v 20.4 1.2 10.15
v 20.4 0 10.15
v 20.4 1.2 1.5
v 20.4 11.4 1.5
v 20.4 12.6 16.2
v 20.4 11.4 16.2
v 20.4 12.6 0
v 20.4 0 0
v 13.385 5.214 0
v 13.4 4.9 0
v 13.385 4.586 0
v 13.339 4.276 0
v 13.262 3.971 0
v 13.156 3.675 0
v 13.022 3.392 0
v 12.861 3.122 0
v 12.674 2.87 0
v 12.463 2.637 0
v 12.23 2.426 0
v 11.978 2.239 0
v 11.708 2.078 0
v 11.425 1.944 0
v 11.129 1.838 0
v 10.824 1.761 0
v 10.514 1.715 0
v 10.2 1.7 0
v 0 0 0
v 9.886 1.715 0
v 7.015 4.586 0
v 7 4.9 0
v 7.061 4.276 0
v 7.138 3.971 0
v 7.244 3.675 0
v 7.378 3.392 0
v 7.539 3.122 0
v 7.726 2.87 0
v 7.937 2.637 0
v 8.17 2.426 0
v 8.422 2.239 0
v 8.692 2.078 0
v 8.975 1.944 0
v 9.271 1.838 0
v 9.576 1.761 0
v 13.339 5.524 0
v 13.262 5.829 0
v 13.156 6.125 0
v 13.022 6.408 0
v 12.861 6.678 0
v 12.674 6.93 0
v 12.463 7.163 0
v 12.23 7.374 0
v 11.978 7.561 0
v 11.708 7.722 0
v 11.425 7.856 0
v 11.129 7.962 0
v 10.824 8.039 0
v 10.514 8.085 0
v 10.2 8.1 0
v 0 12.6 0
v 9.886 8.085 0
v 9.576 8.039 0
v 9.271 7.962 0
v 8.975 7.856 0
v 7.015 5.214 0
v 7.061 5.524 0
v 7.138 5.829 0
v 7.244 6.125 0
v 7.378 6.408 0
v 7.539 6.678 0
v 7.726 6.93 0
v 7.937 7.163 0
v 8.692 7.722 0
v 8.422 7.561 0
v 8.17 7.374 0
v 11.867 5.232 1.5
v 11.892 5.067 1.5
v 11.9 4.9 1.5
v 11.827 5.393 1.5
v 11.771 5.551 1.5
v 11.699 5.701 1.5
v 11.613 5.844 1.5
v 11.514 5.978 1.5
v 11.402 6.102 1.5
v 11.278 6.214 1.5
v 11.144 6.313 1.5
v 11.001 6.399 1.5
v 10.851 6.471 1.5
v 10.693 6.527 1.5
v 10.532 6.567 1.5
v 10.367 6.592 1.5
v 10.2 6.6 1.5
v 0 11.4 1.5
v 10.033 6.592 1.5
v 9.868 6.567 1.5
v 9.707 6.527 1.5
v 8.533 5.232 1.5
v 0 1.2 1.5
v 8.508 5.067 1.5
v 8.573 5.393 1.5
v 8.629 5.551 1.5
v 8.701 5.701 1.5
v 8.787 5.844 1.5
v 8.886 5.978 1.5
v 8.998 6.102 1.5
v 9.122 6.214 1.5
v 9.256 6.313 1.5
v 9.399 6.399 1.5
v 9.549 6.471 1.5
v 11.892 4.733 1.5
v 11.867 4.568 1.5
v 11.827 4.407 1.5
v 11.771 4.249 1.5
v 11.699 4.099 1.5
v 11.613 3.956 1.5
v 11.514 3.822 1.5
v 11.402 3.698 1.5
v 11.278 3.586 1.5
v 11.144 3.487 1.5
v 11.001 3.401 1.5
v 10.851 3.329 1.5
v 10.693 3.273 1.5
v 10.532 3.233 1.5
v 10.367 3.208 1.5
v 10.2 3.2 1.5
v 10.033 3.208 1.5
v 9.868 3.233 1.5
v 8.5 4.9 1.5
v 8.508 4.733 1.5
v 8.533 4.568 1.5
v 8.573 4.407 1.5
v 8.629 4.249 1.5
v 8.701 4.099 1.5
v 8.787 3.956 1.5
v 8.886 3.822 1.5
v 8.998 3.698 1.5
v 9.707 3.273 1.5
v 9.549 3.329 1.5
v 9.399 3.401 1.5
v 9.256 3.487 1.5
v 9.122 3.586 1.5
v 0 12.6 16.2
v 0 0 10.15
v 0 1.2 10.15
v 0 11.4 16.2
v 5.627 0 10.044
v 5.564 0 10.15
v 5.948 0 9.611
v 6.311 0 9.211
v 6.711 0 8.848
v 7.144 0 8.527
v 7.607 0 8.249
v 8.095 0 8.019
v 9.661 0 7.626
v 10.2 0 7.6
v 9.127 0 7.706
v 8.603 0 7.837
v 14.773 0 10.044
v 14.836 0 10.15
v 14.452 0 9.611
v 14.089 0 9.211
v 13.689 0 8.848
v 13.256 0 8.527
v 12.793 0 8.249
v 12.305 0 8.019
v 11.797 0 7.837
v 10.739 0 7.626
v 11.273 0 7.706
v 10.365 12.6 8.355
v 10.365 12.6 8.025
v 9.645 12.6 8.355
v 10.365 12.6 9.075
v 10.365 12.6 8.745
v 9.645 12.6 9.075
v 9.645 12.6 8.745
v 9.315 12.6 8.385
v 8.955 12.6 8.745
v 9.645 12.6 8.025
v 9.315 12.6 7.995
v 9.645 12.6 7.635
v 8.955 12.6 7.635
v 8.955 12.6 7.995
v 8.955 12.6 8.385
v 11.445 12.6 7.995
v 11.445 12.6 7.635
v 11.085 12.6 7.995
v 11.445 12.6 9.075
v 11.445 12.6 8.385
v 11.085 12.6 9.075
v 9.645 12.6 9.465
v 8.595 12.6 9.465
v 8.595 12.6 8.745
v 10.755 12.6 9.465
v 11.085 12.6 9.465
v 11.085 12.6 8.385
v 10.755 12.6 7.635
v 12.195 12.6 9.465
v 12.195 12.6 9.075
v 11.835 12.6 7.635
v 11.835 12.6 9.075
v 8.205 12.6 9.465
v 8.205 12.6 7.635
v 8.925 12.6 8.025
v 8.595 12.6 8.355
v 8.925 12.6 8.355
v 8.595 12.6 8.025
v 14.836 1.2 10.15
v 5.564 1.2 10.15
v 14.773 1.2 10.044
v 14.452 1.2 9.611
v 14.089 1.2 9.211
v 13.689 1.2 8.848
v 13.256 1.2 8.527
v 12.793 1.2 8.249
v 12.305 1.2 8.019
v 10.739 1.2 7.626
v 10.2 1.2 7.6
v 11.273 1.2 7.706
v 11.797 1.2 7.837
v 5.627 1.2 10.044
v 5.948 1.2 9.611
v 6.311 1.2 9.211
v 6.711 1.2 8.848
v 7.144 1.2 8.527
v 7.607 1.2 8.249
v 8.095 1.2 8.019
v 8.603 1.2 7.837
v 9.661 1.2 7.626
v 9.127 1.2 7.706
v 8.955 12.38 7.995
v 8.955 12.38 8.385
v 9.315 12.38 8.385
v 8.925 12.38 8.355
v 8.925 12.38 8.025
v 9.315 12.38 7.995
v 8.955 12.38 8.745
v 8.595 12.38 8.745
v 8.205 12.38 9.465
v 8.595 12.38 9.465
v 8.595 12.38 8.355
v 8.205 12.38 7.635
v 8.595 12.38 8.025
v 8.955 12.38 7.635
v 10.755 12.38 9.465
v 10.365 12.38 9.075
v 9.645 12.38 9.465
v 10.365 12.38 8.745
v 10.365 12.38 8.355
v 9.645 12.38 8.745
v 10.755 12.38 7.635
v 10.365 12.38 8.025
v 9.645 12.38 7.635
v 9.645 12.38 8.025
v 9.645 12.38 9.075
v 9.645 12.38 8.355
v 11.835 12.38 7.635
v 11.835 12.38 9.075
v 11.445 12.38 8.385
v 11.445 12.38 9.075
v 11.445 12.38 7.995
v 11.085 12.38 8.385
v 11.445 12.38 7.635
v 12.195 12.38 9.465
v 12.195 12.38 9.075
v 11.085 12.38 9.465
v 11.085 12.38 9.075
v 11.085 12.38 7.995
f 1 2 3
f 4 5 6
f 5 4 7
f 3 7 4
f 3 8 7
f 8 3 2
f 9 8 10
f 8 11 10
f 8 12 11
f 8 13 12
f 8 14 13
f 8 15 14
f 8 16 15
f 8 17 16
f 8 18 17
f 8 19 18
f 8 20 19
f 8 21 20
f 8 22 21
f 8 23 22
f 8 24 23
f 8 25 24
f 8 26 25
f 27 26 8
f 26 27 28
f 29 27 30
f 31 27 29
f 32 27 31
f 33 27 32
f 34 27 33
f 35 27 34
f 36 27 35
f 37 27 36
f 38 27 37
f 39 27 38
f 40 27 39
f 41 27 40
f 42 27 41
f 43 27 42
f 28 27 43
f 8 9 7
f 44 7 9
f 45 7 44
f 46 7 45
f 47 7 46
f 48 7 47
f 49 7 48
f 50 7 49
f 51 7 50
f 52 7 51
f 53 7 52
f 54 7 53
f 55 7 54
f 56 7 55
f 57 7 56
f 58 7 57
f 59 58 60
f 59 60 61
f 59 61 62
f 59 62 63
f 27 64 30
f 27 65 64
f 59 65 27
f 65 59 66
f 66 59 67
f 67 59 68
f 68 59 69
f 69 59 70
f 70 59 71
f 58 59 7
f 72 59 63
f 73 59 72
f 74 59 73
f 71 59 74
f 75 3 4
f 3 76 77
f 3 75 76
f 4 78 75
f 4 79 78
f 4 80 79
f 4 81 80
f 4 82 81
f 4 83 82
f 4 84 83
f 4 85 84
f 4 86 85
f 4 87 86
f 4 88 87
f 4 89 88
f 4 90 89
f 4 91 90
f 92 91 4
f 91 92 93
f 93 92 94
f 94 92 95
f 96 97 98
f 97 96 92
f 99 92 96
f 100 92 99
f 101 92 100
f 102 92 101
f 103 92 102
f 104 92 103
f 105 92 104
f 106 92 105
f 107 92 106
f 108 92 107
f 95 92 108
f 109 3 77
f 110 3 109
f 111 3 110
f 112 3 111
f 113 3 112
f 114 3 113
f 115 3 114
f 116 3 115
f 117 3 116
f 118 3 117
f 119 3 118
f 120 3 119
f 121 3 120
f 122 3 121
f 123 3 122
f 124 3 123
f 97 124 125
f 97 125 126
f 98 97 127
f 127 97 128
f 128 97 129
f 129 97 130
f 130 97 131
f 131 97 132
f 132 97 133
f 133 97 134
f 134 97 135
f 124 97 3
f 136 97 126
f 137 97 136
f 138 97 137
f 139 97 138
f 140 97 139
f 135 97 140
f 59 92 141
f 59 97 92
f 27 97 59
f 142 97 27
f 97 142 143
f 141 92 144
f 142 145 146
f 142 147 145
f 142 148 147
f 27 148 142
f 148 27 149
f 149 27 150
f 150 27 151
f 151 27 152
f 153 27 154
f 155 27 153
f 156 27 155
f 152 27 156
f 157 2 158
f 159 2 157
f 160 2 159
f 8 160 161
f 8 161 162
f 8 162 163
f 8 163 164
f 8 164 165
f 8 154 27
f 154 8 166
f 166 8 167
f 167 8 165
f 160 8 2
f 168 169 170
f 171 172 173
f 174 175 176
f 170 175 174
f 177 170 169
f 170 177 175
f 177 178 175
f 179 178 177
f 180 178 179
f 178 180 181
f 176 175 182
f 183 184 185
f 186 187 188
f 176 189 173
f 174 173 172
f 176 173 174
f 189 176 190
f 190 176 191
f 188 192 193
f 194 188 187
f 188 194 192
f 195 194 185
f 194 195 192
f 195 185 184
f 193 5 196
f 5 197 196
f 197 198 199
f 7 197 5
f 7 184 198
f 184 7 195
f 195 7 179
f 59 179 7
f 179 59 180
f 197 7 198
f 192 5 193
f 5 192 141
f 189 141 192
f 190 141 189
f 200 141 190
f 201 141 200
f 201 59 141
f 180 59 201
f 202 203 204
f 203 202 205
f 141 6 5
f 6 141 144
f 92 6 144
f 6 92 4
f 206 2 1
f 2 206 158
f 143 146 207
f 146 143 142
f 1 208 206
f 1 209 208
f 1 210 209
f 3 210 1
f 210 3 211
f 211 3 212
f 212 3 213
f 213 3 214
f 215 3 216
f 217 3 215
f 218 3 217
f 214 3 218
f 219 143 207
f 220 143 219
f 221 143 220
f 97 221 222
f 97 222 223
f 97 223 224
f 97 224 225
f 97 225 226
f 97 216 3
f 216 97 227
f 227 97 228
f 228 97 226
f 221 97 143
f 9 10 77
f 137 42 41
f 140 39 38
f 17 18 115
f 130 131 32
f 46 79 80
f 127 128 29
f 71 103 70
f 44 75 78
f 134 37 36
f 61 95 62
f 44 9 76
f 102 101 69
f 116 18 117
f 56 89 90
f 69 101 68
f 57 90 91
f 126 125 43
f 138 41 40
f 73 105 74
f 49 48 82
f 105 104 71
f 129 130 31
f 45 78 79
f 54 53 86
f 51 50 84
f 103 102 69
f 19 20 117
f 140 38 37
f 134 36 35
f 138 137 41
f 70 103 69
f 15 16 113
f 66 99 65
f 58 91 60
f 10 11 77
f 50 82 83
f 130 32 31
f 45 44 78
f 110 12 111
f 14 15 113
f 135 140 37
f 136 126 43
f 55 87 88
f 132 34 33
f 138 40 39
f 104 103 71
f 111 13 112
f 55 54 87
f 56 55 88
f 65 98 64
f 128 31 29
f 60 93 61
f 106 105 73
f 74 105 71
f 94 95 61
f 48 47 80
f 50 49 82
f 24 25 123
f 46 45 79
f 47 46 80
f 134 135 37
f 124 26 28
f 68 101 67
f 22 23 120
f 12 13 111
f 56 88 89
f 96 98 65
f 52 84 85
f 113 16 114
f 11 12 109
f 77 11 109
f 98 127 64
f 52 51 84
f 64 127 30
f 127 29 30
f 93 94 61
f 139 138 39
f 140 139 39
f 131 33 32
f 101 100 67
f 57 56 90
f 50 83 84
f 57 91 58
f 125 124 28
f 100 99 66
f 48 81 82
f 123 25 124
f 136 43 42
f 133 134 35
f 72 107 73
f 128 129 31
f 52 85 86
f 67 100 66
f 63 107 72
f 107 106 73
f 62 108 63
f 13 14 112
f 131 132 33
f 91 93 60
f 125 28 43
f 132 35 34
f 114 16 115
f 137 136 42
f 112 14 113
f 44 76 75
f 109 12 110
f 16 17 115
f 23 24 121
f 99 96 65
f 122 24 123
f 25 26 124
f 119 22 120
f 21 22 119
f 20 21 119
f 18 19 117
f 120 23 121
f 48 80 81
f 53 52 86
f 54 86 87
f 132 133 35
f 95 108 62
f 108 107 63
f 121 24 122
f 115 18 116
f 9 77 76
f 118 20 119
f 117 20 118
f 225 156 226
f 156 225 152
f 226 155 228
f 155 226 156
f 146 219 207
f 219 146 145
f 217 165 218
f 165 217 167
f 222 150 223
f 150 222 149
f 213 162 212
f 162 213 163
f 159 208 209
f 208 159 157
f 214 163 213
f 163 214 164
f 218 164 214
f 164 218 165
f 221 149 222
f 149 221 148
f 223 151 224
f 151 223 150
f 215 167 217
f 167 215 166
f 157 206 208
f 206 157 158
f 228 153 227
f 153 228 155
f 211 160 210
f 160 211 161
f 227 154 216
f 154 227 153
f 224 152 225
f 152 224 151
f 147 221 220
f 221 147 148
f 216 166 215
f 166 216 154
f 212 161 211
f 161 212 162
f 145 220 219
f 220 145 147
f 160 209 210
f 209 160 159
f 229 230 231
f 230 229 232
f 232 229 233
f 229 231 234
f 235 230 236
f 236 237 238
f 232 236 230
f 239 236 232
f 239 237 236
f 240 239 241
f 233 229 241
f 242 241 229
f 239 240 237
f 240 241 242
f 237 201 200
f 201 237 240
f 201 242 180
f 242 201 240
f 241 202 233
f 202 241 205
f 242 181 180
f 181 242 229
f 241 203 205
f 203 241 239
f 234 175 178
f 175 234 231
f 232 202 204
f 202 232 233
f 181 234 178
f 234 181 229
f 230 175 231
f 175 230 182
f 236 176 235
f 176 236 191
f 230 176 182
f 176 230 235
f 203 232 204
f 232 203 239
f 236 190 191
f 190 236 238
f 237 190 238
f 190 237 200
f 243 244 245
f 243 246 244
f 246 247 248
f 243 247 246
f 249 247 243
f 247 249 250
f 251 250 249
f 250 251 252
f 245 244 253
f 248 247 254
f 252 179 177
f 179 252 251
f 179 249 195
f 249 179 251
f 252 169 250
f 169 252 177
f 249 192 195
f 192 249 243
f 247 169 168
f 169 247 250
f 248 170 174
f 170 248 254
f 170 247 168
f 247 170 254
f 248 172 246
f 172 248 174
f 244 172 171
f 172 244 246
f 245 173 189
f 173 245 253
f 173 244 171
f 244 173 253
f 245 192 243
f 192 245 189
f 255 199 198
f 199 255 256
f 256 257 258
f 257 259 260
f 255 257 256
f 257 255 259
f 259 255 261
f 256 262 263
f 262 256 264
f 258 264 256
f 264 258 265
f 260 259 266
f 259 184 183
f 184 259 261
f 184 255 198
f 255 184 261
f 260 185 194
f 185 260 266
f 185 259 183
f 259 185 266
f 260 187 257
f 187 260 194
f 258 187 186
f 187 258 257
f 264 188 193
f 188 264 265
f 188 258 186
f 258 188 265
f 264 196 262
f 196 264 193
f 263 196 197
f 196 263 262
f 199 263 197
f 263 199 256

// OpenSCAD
// 上滾輪滑塊U型防脫罩
$fn=64;
translate([-50.8,-30.1,88.65]){rotate([180,0,0]){difference(){difference(){difference(){union(){union(){translate([50.8,-42.7,87.15]){cube([20.4,12.6,1.5]);}translate([50.8,-42.7,72.45]){cube([20.4,1.2,14.7]);}}translate([50.8,-31.3,78.5]){cube([20.4,1.2,8.65]);}}union(){union(){translate([61,-35,86]){cylinder(h=4,d1=3.4,d2=3.4,$fn=64);}translate([61,-35,88.65]){rotate([180,0,0]){translate([0,0,0]){cylinder(h=1.5,d1=6.4,d2=3.4,$fn=64);}}}}translate([61,-35,88.65]){cylinder(h=0.15,d1=6.4,d2=6.4,$fn=64);}}}translate([61,-32,75.55]){rotate([-90,0,0]){translate([0,0,0]){cylinder(h=4,d1=11,d2=11,$fn=64);}}}}multmatrix([[1,0,0,61],[0,0,-1,-42.7],[0,1,0,80.1],[0,0,0,1]]){union(){union(){union(){union(){union(){union(){union(){union(){union(){union(){union(){union(){union(){union(){union(){union(){union(){union(){union(){union(){union(){union(){union(){union(){union(){union(){translate([-1.995,0.525,-0.22]){cube([0.39,0.39,0.34]);}translate([-1.635,0.525,-0.22]){cube([0.39,0.39,0.34]);}}translate([-1.995,0.165,-0.22]){cube([0.39,0.39,0.34]);}}translate([-1.275,0.165,-0.22]){cube([0.39,0.39,0.34]);}}translate([-1.995,-0.195,-0.22]){cube([0.39,0.39,0.34]);}}translate([-1.635,-0.195,-0.22]){cube([0.39,0.39,0.34]);}}translate([-1.995,-0.555,-0.22]){cube([0.39,0.39,0.34]);}}translate([-1.995,-0.915,-0.22]){cube([0.39,0.39,0.34]);}}translate([-0.555,0.525,-0.22]){cube([0.39,0.39,0.34]);}}translate([-0.195,0.525,-0.22]){cube([0.39,0.39,0.34]);}}translate([0.165,0.525,-0.22]){cube([0.39,0.39,0.34]);}}translate([0.165,0.165,-0.22]){cube([0.39,0.39,0.34]);}}translate([-0.555,-0.195,-0.22]){cube([0.39,0.39,0.34]);}}translate([-0.195,-0.195,-0.22]){cube([0.39,0.39,0.34]);}}translate([0.165,-0.195,-0.22]){cube([0.39,0.39,0.34]);}}translate([0.165,-0.555,-0.22]){cube([0.39,0.39,0.34]);}}translate([-0.555,-0.915,-0.22]){cube([0.39,0.39,0.34]);}}translate([-0.195,-0.915,-0.22]){cube([0.39,0.39,0.34]);}}translate([0.165,-0.915,-0.22]){cube([0.39,0.39,0.34]);}}translate([1.245,0.525,-0.22]){cube([0.39,0.39,0.34]);}}translate([0.885,0.165,-0.22]){cube([0.39,0.39,0.34]);}}translate([1.245,0.165,-0.22]){cube([0.39,0.39,0.34]);}}translate([1.245,-0.195,-0.22]){cube([0.39,0.39,0.34]);}}translate([1.245,-0.555,-0.22]){cube([0.39,0.39,0.34]);}}translate([0.885,-0.915,-0.22]){cube([0.39,0.39,0.34]);}}translate([1.245,-0.915,-0.22]){cube([0.39,0.39,0.34]);}}translate([1.605,-0.915,-0.22]){cube([0.39,0.39,0.34]);}}}}}}
